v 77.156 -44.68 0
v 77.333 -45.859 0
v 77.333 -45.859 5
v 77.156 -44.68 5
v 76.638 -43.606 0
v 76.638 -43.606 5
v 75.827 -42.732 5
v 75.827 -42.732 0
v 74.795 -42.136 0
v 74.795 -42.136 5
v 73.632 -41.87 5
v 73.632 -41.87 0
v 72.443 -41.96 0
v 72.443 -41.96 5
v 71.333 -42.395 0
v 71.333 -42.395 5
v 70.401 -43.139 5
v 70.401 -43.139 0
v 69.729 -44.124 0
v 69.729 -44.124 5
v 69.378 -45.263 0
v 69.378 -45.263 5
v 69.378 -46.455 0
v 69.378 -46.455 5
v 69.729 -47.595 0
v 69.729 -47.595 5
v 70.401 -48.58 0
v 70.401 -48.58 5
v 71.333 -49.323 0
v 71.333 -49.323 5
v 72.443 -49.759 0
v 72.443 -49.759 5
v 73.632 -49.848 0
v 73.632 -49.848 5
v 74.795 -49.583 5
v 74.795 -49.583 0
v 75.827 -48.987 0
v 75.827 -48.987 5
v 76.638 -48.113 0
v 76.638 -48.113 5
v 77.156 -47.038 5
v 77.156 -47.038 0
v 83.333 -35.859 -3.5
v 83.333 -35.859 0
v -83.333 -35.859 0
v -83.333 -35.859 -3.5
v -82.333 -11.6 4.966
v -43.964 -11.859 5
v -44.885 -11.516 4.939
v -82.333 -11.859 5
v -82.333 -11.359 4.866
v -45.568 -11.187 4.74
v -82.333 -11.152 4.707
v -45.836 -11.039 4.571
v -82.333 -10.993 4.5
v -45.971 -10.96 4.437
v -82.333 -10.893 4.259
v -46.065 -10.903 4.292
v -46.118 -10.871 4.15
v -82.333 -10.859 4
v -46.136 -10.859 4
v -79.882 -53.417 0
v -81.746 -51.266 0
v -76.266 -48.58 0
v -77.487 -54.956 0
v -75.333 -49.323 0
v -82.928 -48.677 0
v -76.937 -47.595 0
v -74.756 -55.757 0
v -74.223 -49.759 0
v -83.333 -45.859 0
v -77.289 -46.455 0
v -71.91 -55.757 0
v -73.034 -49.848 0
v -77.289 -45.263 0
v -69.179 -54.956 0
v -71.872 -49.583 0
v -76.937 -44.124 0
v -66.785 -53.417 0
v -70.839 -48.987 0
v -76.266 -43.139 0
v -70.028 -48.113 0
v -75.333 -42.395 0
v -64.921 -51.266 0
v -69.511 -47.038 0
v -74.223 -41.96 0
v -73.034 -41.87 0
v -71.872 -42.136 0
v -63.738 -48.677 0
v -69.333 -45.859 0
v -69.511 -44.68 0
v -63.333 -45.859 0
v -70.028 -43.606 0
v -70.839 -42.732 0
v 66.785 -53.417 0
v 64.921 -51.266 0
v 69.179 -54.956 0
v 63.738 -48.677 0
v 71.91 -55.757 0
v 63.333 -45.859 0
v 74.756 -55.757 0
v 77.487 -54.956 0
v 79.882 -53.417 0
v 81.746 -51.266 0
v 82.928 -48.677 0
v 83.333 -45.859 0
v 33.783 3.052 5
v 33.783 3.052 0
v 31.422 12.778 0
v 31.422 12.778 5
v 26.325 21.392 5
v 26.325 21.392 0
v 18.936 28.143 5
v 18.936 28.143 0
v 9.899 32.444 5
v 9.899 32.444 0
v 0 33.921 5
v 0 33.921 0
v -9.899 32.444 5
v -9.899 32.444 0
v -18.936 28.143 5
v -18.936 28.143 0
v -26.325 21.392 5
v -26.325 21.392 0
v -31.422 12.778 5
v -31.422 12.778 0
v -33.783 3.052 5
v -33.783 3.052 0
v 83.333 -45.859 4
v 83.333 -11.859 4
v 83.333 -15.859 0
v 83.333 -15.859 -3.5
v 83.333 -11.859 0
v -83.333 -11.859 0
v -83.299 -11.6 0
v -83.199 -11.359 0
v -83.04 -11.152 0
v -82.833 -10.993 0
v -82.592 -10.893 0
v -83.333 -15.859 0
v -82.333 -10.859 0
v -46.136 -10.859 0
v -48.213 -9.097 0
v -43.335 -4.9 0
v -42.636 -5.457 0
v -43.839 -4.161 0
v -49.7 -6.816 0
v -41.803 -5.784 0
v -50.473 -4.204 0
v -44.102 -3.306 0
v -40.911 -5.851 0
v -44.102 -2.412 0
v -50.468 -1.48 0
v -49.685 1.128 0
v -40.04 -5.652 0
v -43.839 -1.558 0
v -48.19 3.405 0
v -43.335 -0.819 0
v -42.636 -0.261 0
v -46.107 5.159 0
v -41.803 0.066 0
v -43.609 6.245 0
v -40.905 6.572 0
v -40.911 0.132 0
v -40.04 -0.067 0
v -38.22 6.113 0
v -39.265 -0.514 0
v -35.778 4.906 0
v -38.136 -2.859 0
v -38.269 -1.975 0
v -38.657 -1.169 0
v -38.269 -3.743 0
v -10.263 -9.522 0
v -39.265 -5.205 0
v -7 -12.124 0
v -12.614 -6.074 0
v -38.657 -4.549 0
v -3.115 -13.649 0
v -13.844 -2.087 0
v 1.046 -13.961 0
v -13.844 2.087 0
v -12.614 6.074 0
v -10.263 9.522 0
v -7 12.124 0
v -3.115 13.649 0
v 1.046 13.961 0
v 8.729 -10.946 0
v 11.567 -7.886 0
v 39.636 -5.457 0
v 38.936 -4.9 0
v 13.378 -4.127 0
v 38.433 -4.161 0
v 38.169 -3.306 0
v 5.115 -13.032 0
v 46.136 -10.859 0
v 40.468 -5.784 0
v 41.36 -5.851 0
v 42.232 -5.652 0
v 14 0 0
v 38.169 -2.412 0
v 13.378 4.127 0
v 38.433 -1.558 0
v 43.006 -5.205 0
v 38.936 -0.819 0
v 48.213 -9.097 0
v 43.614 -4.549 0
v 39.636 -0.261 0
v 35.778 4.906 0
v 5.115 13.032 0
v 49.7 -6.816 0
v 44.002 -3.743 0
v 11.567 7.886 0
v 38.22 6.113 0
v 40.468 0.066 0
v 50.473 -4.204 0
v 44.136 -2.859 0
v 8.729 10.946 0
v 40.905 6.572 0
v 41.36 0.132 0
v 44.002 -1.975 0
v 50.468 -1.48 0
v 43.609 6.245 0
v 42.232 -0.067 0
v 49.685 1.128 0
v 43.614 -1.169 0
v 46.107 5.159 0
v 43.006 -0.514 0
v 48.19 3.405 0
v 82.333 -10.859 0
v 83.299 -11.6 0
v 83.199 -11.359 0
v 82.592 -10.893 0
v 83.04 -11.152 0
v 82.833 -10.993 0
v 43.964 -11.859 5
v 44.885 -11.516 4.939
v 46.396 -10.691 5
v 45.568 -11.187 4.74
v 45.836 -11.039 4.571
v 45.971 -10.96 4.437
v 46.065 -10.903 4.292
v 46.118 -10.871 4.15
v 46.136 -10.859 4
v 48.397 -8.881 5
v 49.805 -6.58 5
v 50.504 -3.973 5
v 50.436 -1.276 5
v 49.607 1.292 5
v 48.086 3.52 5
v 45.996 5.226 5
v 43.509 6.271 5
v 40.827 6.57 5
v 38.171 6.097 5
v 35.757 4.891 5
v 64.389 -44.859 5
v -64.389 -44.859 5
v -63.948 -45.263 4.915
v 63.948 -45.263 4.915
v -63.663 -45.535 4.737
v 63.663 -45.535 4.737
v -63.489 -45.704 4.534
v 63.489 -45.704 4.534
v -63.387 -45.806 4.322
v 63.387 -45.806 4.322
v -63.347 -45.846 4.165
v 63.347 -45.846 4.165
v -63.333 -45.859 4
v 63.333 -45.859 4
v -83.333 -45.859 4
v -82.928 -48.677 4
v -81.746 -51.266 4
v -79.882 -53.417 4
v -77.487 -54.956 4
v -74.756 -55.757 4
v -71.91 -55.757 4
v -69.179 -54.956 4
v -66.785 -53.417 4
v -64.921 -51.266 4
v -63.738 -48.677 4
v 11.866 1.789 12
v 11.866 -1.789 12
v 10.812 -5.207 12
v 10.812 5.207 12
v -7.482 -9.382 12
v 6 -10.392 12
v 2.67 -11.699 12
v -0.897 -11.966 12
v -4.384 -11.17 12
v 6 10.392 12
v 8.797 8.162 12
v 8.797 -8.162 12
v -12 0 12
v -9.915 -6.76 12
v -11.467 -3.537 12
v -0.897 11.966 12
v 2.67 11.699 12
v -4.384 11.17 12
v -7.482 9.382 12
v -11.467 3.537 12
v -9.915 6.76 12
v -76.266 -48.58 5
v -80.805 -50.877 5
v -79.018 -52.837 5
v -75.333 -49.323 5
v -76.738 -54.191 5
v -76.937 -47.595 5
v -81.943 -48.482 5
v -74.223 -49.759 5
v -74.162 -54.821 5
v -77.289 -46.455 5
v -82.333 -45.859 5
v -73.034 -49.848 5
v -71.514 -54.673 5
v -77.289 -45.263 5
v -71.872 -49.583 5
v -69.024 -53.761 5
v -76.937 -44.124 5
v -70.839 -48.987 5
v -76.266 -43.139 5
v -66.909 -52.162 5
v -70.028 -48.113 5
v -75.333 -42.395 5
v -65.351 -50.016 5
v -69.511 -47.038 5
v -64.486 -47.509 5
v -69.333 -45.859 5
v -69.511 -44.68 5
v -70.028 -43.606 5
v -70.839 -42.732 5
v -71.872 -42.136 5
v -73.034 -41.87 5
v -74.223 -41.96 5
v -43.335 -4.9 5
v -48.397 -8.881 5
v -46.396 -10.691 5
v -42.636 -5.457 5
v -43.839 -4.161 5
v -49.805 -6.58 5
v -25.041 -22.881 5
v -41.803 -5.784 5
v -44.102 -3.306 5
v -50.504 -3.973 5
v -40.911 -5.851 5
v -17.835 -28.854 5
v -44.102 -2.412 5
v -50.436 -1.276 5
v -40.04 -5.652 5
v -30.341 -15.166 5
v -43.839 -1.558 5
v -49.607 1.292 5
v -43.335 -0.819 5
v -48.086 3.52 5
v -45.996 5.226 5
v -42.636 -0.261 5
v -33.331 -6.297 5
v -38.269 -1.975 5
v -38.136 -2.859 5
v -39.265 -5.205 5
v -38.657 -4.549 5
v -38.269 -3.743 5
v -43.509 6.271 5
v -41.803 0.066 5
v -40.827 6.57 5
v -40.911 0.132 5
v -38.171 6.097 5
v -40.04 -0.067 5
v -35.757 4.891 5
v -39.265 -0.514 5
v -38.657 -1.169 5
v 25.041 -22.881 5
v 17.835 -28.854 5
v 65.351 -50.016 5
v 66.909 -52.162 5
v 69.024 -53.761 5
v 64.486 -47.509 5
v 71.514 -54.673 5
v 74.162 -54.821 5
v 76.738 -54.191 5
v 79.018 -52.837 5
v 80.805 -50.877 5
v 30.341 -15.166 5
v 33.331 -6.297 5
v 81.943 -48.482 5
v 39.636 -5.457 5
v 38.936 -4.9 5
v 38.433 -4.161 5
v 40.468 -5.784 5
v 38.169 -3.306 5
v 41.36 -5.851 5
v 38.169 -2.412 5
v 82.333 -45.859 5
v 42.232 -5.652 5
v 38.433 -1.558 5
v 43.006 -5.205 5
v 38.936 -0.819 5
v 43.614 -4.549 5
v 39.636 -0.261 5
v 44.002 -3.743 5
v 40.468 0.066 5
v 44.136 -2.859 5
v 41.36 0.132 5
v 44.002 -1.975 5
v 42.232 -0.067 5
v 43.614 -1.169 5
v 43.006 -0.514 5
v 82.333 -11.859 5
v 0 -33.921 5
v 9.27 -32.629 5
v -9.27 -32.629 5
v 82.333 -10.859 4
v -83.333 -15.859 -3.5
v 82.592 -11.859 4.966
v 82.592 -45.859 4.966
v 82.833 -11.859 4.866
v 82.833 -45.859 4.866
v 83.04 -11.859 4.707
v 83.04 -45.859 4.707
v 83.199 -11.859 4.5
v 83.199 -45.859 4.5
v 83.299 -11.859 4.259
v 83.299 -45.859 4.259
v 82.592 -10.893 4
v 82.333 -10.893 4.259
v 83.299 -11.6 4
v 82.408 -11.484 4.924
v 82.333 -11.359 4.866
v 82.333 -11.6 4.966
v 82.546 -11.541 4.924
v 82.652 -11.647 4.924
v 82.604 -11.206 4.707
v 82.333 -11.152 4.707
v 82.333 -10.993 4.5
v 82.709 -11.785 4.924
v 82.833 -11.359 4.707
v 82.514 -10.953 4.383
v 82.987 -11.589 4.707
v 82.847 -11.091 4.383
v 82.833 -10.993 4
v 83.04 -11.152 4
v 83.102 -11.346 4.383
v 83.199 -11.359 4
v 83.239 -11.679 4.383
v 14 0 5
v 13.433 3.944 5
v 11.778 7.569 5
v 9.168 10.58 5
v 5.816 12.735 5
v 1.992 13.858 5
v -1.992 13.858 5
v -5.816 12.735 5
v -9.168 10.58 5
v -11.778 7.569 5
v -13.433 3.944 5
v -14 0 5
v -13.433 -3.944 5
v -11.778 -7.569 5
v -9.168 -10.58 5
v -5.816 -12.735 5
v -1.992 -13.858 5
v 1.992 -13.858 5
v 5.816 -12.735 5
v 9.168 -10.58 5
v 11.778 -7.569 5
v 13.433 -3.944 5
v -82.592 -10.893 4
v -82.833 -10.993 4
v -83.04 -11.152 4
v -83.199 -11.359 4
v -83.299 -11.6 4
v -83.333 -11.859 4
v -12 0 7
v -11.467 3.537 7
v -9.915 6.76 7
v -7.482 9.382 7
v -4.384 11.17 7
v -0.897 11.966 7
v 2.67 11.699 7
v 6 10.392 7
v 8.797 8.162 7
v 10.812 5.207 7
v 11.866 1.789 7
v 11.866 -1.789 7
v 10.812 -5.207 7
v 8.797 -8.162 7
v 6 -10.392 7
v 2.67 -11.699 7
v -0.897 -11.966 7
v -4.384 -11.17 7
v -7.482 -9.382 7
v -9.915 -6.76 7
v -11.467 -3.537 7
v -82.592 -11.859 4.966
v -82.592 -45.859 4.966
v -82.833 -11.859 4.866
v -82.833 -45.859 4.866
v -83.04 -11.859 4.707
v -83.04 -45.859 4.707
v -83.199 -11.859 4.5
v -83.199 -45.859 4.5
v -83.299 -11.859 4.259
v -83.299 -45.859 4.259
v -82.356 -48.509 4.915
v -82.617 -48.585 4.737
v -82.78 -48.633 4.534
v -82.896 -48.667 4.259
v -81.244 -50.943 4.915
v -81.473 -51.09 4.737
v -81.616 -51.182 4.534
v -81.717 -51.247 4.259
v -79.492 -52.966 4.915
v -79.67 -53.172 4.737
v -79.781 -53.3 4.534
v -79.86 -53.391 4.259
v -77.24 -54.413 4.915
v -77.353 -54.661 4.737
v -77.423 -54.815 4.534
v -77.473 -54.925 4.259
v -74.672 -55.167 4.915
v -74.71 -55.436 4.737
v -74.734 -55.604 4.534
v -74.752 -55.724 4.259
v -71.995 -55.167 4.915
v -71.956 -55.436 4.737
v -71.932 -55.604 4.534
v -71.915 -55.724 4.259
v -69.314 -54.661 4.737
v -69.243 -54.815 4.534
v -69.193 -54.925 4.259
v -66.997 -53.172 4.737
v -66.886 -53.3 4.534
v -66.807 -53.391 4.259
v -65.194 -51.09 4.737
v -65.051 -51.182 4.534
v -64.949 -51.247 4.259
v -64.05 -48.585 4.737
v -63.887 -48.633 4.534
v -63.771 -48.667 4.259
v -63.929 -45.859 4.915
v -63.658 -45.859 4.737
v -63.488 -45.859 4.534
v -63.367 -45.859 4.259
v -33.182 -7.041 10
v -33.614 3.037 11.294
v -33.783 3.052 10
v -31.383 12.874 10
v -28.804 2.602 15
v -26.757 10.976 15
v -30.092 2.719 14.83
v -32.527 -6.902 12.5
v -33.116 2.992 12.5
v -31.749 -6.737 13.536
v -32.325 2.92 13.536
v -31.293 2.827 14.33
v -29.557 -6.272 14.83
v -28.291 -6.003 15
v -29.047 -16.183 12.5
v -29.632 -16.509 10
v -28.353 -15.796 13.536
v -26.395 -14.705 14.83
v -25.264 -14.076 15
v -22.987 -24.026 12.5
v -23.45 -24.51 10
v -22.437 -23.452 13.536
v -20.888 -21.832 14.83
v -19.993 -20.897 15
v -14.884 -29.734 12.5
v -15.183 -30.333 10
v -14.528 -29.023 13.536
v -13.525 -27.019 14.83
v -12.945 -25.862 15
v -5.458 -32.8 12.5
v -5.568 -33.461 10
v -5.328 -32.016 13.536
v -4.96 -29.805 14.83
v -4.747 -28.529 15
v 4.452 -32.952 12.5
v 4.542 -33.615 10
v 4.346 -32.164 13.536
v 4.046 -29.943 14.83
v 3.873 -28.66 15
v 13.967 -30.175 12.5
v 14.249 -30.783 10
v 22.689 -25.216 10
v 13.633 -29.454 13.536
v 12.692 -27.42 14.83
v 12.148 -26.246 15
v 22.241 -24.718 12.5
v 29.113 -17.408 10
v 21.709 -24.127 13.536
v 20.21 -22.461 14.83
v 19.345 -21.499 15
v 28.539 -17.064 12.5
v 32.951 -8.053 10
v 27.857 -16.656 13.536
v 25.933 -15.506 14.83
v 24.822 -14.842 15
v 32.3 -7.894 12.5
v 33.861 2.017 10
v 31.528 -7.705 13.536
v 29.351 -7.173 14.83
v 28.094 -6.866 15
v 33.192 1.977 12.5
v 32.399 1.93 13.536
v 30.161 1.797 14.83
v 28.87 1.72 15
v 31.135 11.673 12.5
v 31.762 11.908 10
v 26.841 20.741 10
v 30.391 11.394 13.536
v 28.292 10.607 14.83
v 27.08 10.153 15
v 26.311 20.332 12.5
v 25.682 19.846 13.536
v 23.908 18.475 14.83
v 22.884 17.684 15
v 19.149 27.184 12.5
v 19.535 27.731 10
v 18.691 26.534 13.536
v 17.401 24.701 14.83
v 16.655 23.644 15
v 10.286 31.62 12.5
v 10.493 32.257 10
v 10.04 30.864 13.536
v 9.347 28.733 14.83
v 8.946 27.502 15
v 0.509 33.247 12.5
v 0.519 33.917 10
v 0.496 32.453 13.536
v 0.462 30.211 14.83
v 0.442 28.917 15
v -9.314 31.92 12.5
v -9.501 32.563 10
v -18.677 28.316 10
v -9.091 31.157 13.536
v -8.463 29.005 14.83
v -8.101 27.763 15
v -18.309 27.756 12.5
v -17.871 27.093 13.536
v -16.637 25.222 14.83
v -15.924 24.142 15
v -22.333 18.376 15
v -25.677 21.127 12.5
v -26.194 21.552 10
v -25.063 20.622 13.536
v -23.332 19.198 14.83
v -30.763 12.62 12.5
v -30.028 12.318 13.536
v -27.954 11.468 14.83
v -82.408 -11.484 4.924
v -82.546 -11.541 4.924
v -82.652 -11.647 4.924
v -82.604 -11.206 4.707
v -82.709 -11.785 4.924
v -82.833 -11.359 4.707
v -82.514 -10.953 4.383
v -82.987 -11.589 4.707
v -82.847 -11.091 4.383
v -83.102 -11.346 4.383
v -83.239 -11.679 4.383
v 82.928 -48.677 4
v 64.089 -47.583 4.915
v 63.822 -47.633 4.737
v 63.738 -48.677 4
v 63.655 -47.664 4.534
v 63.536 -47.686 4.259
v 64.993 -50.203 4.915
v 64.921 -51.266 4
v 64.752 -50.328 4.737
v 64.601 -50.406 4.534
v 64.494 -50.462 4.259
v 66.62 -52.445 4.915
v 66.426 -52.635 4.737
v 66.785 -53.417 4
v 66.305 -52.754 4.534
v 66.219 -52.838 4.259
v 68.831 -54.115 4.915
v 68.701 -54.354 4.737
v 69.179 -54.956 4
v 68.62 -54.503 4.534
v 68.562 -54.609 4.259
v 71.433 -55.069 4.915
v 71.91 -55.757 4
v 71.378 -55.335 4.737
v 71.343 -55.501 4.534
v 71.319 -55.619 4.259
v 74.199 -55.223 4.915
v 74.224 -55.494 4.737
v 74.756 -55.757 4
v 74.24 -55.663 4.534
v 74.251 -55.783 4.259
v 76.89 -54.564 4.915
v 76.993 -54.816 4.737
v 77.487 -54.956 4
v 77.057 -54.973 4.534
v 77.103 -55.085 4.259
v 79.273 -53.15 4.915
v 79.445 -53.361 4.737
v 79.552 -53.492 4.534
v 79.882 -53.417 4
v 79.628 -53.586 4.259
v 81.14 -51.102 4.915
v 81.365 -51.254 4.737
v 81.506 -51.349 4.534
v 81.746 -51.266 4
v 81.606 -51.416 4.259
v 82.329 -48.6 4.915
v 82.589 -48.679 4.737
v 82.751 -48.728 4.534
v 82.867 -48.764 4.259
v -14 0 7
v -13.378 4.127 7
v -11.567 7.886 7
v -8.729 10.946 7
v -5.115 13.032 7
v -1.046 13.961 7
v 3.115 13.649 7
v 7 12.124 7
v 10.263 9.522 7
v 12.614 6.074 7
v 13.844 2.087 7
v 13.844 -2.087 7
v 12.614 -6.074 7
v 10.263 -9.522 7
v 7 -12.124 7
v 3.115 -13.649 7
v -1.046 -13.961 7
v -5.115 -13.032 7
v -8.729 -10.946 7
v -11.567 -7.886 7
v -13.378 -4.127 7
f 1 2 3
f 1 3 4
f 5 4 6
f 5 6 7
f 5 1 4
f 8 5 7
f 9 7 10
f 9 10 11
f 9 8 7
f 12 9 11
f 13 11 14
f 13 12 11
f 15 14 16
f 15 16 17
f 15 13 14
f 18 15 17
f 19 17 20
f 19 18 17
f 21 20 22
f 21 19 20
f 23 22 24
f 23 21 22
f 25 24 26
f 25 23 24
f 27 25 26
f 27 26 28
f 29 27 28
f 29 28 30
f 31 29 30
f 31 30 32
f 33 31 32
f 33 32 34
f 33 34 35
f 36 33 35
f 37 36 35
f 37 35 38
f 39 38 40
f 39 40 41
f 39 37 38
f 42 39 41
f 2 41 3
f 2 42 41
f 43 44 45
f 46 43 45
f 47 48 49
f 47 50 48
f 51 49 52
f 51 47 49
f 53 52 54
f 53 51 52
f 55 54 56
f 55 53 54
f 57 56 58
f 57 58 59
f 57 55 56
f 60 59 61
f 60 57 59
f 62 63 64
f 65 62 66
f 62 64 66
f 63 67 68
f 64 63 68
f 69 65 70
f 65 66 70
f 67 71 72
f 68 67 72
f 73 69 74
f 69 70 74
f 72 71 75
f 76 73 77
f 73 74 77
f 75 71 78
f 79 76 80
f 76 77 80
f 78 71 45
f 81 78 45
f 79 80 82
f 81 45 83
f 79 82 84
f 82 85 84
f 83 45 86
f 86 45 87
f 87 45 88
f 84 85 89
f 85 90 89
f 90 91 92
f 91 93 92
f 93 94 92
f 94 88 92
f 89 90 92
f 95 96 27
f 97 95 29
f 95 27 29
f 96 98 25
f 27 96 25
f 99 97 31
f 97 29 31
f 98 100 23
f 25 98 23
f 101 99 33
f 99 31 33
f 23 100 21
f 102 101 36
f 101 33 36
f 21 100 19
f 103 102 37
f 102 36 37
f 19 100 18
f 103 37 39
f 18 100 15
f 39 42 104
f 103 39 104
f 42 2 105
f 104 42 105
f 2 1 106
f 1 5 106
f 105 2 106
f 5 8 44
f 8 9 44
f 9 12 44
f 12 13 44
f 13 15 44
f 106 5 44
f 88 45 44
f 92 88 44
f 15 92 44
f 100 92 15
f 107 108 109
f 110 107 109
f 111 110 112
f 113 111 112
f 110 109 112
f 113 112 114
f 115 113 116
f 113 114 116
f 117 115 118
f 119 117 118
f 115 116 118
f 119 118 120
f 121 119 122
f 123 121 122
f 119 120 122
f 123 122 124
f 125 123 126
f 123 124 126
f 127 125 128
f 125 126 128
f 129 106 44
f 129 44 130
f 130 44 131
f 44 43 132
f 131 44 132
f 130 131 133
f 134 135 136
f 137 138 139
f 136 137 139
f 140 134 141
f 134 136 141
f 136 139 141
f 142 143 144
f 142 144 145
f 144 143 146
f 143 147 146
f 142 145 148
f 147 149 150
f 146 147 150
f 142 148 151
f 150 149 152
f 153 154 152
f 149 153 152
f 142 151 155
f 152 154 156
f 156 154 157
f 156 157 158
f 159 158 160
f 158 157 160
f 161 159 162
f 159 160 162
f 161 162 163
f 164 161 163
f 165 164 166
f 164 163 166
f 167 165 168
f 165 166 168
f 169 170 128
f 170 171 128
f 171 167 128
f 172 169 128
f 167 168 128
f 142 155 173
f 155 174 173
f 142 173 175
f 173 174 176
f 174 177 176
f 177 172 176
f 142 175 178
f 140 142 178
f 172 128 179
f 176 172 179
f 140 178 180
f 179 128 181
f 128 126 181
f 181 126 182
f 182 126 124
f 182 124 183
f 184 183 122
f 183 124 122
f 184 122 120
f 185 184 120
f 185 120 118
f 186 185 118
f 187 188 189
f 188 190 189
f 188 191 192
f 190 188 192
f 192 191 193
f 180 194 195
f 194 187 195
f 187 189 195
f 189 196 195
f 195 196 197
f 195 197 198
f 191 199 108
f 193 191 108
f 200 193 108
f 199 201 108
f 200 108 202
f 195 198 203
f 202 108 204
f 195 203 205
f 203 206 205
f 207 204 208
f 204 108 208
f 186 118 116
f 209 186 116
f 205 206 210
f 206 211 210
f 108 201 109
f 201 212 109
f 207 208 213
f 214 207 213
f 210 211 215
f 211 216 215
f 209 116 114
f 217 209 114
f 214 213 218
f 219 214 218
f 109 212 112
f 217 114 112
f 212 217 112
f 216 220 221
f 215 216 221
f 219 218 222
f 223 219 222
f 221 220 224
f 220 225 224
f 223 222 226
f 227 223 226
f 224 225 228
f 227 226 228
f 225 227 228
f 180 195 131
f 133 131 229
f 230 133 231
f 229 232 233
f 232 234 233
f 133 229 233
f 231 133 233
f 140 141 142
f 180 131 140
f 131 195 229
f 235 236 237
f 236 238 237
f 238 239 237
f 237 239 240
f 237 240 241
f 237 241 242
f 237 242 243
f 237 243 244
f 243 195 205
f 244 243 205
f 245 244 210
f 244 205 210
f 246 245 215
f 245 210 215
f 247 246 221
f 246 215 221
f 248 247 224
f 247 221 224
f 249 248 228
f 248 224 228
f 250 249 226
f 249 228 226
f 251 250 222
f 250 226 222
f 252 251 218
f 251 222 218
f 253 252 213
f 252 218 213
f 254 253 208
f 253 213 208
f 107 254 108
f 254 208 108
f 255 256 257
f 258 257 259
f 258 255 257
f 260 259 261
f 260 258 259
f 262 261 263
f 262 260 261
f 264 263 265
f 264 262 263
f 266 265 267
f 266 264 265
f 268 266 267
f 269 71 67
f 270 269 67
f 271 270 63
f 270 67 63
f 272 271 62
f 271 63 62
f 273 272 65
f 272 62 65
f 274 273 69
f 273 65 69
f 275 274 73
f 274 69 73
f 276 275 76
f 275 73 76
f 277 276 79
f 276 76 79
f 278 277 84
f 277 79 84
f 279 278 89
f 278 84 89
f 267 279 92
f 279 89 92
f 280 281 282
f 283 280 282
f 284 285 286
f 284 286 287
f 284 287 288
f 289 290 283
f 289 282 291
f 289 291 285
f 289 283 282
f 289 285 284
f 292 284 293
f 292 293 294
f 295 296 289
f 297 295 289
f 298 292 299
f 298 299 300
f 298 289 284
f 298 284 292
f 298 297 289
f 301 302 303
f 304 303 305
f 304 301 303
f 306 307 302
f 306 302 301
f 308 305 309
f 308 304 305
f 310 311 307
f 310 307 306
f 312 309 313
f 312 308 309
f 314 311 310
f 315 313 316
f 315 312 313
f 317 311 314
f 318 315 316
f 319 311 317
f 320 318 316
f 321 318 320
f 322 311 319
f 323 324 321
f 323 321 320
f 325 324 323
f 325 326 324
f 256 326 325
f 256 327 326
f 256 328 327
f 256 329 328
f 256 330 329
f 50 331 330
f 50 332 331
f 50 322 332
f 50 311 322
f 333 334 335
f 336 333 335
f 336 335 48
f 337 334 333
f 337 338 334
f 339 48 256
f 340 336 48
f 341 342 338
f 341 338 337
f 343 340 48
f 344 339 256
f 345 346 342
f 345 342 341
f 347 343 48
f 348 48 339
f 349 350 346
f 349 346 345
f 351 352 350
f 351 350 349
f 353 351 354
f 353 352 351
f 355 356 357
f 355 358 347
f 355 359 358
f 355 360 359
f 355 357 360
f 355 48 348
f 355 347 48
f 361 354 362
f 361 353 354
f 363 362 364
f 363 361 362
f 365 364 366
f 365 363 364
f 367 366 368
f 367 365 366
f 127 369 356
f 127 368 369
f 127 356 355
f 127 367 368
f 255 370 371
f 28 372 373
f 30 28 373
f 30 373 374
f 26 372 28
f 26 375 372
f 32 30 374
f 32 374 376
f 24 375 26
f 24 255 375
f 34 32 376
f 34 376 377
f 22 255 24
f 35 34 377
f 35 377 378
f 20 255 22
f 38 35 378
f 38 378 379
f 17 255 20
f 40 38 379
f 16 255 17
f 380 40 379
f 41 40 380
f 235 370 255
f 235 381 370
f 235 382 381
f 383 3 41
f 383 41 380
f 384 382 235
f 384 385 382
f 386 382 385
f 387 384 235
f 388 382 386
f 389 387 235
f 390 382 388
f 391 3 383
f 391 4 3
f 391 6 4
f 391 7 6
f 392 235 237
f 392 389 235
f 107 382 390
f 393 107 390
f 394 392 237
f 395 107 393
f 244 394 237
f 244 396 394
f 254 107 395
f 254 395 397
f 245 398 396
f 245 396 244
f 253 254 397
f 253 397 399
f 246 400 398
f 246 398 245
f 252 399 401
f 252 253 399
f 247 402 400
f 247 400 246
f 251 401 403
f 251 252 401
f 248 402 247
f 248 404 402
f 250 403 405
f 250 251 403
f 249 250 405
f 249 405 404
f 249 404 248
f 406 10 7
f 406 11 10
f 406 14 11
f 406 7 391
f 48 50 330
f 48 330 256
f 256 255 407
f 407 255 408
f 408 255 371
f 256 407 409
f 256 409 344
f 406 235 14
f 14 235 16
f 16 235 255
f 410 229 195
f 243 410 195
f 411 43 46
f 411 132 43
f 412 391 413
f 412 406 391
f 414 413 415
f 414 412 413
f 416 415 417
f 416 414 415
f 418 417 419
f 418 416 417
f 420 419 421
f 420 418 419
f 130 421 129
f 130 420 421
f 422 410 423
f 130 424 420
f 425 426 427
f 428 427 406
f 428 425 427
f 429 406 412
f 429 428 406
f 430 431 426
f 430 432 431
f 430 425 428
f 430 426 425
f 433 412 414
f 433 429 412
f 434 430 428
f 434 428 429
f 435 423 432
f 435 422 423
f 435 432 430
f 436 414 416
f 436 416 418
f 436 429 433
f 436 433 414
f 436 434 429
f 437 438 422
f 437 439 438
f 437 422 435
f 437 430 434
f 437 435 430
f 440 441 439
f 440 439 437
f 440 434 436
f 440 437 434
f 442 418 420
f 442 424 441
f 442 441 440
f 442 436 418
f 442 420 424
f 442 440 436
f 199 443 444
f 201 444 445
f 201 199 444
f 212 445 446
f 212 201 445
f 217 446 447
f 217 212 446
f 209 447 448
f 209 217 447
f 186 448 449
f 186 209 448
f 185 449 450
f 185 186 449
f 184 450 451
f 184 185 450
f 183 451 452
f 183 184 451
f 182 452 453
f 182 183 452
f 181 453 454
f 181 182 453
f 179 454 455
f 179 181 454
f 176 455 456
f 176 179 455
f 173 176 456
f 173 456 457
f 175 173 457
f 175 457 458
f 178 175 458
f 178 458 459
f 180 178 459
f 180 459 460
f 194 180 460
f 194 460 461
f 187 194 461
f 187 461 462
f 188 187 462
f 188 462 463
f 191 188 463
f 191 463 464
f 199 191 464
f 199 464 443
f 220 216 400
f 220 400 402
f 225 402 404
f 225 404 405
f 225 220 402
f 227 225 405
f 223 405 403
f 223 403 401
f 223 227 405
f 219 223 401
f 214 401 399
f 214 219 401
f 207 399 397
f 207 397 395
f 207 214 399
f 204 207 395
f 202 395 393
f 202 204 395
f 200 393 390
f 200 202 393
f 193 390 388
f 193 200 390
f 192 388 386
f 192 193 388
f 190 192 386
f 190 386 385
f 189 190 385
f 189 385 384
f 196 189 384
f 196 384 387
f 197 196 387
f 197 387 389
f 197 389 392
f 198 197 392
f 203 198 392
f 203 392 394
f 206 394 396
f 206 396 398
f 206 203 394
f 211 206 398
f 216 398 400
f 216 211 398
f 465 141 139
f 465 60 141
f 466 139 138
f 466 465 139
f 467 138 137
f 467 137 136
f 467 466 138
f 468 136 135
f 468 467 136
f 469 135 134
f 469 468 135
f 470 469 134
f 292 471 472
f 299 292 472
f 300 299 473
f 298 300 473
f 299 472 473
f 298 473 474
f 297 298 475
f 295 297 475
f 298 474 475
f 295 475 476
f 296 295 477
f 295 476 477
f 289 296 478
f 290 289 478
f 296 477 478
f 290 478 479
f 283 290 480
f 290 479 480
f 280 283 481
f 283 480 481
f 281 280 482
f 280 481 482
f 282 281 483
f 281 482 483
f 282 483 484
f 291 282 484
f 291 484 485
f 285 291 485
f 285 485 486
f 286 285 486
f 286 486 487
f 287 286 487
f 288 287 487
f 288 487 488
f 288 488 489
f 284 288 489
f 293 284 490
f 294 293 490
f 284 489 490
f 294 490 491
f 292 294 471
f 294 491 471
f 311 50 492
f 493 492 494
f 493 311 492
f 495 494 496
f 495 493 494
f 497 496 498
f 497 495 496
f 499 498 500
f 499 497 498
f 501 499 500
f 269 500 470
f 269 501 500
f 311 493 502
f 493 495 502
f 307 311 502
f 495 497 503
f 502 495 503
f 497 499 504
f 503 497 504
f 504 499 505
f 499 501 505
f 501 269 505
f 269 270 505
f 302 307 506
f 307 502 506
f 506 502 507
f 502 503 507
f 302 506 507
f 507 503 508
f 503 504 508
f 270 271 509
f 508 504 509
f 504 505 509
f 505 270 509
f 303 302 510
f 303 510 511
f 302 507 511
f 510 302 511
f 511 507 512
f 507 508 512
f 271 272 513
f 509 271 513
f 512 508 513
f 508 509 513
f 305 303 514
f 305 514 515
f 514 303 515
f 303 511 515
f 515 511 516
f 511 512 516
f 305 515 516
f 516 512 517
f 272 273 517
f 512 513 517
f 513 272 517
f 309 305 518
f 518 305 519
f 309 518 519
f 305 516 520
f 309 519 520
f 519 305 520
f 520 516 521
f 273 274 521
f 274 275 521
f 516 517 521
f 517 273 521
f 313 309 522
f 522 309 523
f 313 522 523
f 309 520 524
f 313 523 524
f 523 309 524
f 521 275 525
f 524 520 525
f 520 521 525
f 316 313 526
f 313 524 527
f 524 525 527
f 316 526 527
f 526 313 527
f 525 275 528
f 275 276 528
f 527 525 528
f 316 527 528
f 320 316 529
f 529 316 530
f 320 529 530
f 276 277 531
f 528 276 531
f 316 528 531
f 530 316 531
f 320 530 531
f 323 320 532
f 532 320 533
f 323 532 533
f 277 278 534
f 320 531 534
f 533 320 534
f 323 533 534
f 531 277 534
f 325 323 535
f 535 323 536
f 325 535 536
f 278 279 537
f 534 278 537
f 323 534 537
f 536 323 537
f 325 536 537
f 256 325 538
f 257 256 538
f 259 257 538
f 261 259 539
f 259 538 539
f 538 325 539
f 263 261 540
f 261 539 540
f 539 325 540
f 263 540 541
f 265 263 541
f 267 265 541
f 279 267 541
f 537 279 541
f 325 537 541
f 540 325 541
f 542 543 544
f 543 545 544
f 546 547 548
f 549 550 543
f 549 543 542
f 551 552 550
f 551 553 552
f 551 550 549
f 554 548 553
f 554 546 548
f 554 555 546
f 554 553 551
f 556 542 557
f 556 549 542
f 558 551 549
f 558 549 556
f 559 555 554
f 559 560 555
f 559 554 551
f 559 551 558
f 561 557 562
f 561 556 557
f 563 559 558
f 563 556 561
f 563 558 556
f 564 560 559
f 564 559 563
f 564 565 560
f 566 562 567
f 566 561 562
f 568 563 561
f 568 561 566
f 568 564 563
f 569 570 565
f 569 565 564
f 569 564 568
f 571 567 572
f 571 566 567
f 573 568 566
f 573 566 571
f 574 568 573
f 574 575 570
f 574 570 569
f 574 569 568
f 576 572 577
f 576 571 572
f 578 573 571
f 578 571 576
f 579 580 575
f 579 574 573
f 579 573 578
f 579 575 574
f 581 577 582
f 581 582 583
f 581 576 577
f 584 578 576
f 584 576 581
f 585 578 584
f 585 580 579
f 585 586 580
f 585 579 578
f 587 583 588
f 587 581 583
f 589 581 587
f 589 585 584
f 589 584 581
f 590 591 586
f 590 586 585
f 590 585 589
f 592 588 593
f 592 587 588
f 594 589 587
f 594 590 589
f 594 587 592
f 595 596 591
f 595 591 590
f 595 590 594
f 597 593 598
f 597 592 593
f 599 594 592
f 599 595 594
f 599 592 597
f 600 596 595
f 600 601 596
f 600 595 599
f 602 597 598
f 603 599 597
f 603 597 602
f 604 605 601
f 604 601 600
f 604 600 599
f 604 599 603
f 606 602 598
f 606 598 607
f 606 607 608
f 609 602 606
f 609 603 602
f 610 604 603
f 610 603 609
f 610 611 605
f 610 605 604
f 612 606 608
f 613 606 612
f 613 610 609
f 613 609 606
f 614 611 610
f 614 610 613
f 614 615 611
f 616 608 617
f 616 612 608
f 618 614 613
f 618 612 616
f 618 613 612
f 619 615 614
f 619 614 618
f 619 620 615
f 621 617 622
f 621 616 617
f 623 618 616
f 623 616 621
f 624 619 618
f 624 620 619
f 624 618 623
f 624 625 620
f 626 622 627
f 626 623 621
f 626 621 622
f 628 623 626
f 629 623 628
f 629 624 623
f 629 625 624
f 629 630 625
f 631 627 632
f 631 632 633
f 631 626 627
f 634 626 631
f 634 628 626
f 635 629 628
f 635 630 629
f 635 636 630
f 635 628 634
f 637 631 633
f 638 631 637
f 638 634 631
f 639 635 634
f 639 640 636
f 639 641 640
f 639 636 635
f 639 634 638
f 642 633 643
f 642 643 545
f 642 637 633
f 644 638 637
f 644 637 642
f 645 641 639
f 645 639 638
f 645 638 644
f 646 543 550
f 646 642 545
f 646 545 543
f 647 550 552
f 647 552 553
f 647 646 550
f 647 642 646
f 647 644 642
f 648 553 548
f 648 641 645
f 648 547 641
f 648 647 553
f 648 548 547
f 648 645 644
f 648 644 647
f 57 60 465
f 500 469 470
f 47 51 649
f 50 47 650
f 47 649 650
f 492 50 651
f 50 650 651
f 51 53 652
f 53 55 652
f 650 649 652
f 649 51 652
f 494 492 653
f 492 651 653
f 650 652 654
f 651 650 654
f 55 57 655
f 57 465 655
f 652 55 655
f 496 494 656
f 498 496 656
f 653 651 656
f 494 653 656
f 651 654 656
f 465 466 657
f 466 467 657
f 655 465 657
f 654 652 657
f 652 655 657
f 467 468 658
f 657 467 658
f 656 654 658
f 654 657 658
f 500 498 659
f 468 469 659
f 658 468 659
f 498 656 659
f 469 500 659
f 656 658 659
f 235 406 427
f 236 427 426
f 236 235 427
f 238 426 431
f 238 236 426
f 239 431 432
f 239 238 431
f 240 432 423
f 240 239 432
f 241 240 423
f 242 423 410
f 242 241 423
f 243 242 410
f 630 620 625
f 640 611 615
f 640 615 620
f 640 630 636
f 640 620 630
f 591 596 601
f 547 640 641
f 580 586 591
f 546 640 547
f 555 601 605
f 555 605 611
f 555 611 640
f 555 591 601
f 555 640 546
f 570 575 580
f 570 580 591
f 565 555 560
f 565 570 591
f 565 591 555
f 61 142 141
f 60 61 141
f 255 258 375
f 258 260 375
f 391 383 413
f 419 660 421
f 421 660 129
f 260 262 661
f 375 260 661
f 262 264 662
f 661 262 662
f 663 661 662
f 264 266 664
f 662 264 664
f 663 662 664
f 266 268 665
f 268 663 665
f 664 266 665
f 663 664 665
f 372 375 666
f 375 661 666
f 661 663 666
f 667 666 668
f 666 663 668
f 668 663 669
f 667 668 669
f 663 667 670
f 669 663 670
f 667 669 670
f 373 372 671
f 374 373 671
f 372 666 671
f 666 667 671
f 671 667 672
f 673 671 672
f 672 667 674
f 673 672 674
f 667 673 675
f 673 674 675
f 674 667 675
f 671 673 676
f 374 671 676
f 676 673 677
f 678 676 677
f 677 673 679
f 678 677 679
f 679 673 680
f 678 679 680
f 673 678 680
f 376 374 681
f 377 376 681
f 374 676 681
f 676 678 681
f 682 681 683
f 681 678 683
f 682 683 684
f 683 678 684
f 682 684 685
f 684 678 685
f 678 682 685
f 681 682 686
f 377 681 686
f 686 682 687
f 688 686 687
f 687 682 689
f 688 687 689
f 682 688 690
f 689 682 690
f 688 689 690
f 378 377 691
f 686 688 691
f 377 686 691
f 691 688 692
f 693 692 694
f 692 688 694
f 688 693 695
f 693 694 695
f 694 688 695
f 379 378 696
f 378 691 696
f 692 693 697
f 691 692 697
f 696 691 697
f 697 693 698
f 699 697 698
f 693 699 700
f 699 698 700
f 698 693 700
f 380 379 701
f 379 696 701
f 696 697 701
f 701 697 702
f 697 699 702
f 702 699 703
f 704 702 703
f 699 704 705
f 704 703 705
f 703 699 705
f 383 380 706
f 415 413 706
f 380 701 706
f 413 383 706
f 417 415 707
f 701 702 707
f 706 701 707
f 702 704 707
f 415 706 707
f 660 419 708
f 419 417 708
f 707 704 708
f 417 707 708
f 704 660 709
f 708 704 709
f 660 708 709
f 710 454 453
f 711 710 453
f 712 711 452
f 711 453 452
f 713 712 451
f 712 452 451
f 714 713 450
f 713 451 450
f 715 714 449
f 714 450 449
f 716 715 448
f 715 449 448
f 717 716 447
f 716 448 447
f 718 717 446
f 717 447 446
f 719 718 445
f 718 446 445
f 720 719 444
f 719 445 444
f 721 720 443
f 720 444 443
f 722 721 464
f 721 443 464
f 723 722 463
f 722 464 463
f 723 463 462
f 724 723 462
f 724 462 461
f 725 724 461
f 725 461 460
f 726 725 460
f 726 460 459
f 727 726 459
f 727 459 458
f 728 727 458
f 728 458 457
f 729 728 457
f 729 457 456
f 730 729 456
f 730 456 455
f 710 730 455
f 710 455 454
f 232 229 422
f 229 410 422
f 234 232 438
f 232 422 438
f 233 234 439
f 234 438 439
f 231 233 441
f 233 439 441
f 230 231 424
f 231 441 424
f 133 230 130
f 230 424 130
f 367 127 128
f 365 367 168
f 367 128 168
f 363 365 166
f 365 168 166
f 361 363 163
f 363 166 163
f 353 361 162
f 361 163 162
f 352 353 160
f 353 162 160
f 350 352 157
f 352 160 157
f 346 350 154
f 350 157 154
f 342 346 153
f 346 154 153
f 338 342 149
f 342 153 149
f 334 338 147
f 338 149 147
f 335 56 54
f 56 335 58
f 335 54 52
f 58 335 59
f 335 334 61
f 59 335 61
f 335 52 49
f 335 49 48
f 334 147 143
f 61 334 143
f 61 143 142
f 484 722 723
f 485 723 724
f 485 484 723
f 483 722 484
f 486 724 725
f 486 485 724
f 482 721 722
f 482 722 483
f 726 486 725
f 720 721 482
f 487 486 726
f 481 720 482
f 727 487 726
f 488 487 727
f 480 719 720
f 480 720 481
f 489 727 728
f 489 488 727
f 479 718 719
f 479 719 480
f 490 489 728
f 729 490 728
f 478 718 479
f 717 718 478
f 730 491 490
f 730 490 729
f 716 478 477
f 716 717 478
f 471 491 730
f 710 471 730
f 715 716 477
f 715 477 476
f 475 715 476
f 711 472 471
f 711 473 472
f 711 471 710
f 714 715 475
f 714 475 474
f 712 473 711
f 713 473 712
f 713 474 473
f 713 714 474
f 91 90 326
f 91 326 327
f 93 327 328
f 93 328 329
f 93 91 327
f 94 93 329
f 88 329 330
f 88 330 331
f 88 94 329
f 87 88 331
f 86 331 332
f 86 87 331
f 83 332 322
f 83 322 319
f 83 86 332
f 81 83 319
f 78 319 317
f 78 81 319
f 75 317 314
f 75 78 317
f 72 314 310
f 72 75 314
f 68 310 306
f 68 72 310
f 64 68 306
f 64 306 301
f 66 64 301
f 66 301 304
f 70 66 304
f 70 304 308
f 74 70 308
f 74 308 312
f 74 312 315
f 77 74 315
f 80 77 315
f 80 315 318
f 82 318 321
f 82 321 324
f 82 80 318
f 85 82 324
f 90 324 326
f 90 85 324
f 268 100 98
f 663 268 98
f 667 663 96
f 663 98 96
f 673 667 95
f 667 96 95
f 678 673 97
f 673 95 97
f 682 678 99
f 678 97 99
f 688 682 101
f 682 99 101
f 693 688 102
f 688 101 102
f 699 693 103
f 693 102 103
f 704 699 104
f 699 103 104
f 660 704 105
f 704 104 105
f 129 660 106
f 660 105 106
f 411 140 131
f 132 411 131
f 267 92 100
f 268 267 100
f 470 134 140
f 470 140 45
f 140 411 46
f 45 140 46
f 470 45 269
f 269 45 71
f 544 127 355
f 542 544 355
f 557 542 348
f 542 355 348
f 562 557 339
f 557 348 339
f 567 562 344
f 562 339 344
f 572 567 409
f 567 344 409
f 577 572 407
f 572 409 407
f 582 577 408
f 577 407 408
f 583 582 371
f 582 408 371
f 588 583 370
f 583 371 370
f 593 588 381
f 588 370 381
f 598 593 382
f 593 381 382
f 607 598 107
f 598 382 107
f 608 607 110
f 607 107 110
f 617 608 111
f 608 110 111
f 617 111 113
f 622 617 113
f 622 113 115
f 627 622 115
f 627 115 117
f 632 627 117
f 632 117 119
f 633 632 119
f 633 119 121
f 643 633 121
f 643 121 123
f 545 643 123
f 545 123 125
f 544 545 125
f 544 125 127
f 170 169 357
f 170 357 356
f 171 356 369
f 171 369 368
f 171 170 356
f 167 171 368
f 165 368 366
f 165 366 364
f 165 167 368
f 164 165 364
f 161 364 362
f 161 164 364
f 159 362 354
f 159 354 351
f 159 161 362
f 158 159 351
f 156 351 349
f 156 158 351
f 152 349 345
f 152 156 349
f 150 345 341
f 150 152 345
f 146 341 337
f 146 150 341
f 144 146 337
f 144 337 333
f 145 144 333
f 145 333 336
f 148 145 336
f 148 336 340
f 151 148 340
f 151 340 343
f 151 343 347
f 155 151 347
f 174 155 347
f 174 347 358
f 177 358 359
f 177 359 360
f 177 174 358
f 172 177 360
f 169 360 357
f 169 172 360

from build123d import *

# Parameters (mm, degrees)
SKETCH1_R           = 4
SKETCH1_R_2         = 3
SKETCH1_R_3         = 14
BOSS_EXTRUDE2_DEPTH = 5
SKETCH2_R           = 33.920814748
BOSS_EXTRUDE3_DEPTH = 10
BOSS_EXTRUDE4_DEPTH = 3.5
SKETCH5_R           = 14
CUT_EXTRUDE1_DEPTH  = 2
FILLET1_R           = 5
SKETCH6_R           = 12
CUT_EXTRUDE2_DEPTH  = 5
FILLET2_R           = 1


with BuildPart() as part:
    # Sketch1 → Boss-Extrude2 (new body)
    with BuildSketch(Plane.XY):
        with BuildLine():
            Line((-83.333333333, -10.859226218), (-83.333333333, -35.859226218))
            Line((-83.333333333, -35.859226218), (-83.333333333, -45.859226218))
            ThreePointArc((-83.333333333, -45.859226218), (-73.333333333, -55.859226218), (-63.333333333, -45.859226218))
            Line((-63.333333333, -45.859226218), (0, -45.859226218))
            Line((0, -45.859226218), (63.333333333, -45.859226218))
            ThreePointArc((63.333333333, -45.859226218), (73.333333333, -55.859226218), (83.333333333, -45.859226218))
            Line((83.333333333, -45.859226218), (83.333333333, -35.859226218))
            Line((83.333333333, -35.859226218), (83.333333333, -10.859226218))
            Line((83.333333333, -10.859226218), (46.135632545, -10.859226218))
            ThreePointArc((46.135632545, -10.859226218), (48.189979587, 3.404653395), (33.783237398, 3.051973795))
            ThreePointArc((33.783237398, 3.051973795), (0, 33.920814748), (-33.783237398, 3.051973795))
            ThreePointArc((-33.783237398, 3.051973795), (-48.189979587, 3.404653395), (-46.135632545, -10.859226218))
            Line((-46.135632545, -10.859226218), (-83.333333333, -10.859226218))
        make_face()
        with Locations((-73.333333333, -45.859226218)):
            Circle(SKETCH1_R, mode=Mode.SUBTRACT)
        with Locations((73.333333333, -45.859226218)):
            Circle(SKETCH1_R, mode=Mode.SUBTRACT)
        with Locations((-41.135632545, -2.859226218)):
            Circle(SKETCH1_R_2, mode=Mode.SUBTRACT)
        Circle(SKETCH1_R_3, mode=Mode.SUBTRACT)
        with Locations((41.135632545, -2.859226218)):
            Circle(SKETCH1_R_2, mode=Mode.SUBTRACT)
    extrude(amount=BOSS_EXTRUDE2_DEPTH)

    # Sketch2 → Boss-Extrude3 (add)
    with BuildSketch(Plane.XY.offset(5)):
        with Locations(Location((0, 0, 0), (0, 0, 174.837918502))):
            Circle(SKETCH2_R)
    extrude(amount=BOSS_EXTRUDE3_DEPTH)

    # Sketch3 → Boss-Extrude4 (add)
    with BuildSketch(Plane(origin=(0, 0, 0), x_dir=(-1, 0, 0), z_dir=(0, 0, -1))):
        Polygon((-83.333333333, -35.859226218), (83.333333333, -35.859226218), (83.333333333, -15.859226218), (-5.229680356, -15.859226218), (-83.333333333, -15.859226218), align=None)
    extrude(amount=BOSS_EXTRUDE4_DEPTH)

    # Sketch5 → Cut-Extrude1 (cut)
    with BuildSketch(Plane(origin=(0, 0, 5), x_dir=(-1, 0, 0), z_dir=(0, 0, -1))):
        Circle(SKETCH5_R)
    extrude(amount=-CUT_EXTRUDE1_DEPTH, mode=Mode.SUBTRACT)

    # Fillet1
    fillet1_edges = [part.edges().sort_by_distance(p)[0] for p in [
        (33.783237398, -3.051973795, 15),
    ]]
    fillet(fillet1_edges, radius=FILLET1_R)

    # Sketch6 → Cut-Extrude2 (cut)
    with BuildSketch(Plane(origin=(0, 0, 7), x_dir=(-1, 0, 0), z_dir=(0, 0, -1))):
        Circle(SKETCH6_R)
    extrude(amount=-CUT_EXTRUDE2_DEPTH, mode=Mode.SUBTRACT)

    # Fillet2
    fillet2_edges = [part.edges().sort_by_distance(p)[0] for p in [
        (83.333333333, -10.859226218, 2.5),
        (-83.333333333, -10.859226218, 2.5),
        (64.734482939, -10.859226218, 5),
        (-64.734482939, -10.859226218, 5),
        (-83.333333333, -28.359226218, 5),
        (-73.333333333, -55.859226218, 5),
        (0, -45.859226218, 5),
        (73.333333333, -55.859226218, 5),
        (83.333333333, -28.359226218, 5),
    ]]
    fillet(fillet2_edges, radius=FILLET2_R)


solid = part.part
